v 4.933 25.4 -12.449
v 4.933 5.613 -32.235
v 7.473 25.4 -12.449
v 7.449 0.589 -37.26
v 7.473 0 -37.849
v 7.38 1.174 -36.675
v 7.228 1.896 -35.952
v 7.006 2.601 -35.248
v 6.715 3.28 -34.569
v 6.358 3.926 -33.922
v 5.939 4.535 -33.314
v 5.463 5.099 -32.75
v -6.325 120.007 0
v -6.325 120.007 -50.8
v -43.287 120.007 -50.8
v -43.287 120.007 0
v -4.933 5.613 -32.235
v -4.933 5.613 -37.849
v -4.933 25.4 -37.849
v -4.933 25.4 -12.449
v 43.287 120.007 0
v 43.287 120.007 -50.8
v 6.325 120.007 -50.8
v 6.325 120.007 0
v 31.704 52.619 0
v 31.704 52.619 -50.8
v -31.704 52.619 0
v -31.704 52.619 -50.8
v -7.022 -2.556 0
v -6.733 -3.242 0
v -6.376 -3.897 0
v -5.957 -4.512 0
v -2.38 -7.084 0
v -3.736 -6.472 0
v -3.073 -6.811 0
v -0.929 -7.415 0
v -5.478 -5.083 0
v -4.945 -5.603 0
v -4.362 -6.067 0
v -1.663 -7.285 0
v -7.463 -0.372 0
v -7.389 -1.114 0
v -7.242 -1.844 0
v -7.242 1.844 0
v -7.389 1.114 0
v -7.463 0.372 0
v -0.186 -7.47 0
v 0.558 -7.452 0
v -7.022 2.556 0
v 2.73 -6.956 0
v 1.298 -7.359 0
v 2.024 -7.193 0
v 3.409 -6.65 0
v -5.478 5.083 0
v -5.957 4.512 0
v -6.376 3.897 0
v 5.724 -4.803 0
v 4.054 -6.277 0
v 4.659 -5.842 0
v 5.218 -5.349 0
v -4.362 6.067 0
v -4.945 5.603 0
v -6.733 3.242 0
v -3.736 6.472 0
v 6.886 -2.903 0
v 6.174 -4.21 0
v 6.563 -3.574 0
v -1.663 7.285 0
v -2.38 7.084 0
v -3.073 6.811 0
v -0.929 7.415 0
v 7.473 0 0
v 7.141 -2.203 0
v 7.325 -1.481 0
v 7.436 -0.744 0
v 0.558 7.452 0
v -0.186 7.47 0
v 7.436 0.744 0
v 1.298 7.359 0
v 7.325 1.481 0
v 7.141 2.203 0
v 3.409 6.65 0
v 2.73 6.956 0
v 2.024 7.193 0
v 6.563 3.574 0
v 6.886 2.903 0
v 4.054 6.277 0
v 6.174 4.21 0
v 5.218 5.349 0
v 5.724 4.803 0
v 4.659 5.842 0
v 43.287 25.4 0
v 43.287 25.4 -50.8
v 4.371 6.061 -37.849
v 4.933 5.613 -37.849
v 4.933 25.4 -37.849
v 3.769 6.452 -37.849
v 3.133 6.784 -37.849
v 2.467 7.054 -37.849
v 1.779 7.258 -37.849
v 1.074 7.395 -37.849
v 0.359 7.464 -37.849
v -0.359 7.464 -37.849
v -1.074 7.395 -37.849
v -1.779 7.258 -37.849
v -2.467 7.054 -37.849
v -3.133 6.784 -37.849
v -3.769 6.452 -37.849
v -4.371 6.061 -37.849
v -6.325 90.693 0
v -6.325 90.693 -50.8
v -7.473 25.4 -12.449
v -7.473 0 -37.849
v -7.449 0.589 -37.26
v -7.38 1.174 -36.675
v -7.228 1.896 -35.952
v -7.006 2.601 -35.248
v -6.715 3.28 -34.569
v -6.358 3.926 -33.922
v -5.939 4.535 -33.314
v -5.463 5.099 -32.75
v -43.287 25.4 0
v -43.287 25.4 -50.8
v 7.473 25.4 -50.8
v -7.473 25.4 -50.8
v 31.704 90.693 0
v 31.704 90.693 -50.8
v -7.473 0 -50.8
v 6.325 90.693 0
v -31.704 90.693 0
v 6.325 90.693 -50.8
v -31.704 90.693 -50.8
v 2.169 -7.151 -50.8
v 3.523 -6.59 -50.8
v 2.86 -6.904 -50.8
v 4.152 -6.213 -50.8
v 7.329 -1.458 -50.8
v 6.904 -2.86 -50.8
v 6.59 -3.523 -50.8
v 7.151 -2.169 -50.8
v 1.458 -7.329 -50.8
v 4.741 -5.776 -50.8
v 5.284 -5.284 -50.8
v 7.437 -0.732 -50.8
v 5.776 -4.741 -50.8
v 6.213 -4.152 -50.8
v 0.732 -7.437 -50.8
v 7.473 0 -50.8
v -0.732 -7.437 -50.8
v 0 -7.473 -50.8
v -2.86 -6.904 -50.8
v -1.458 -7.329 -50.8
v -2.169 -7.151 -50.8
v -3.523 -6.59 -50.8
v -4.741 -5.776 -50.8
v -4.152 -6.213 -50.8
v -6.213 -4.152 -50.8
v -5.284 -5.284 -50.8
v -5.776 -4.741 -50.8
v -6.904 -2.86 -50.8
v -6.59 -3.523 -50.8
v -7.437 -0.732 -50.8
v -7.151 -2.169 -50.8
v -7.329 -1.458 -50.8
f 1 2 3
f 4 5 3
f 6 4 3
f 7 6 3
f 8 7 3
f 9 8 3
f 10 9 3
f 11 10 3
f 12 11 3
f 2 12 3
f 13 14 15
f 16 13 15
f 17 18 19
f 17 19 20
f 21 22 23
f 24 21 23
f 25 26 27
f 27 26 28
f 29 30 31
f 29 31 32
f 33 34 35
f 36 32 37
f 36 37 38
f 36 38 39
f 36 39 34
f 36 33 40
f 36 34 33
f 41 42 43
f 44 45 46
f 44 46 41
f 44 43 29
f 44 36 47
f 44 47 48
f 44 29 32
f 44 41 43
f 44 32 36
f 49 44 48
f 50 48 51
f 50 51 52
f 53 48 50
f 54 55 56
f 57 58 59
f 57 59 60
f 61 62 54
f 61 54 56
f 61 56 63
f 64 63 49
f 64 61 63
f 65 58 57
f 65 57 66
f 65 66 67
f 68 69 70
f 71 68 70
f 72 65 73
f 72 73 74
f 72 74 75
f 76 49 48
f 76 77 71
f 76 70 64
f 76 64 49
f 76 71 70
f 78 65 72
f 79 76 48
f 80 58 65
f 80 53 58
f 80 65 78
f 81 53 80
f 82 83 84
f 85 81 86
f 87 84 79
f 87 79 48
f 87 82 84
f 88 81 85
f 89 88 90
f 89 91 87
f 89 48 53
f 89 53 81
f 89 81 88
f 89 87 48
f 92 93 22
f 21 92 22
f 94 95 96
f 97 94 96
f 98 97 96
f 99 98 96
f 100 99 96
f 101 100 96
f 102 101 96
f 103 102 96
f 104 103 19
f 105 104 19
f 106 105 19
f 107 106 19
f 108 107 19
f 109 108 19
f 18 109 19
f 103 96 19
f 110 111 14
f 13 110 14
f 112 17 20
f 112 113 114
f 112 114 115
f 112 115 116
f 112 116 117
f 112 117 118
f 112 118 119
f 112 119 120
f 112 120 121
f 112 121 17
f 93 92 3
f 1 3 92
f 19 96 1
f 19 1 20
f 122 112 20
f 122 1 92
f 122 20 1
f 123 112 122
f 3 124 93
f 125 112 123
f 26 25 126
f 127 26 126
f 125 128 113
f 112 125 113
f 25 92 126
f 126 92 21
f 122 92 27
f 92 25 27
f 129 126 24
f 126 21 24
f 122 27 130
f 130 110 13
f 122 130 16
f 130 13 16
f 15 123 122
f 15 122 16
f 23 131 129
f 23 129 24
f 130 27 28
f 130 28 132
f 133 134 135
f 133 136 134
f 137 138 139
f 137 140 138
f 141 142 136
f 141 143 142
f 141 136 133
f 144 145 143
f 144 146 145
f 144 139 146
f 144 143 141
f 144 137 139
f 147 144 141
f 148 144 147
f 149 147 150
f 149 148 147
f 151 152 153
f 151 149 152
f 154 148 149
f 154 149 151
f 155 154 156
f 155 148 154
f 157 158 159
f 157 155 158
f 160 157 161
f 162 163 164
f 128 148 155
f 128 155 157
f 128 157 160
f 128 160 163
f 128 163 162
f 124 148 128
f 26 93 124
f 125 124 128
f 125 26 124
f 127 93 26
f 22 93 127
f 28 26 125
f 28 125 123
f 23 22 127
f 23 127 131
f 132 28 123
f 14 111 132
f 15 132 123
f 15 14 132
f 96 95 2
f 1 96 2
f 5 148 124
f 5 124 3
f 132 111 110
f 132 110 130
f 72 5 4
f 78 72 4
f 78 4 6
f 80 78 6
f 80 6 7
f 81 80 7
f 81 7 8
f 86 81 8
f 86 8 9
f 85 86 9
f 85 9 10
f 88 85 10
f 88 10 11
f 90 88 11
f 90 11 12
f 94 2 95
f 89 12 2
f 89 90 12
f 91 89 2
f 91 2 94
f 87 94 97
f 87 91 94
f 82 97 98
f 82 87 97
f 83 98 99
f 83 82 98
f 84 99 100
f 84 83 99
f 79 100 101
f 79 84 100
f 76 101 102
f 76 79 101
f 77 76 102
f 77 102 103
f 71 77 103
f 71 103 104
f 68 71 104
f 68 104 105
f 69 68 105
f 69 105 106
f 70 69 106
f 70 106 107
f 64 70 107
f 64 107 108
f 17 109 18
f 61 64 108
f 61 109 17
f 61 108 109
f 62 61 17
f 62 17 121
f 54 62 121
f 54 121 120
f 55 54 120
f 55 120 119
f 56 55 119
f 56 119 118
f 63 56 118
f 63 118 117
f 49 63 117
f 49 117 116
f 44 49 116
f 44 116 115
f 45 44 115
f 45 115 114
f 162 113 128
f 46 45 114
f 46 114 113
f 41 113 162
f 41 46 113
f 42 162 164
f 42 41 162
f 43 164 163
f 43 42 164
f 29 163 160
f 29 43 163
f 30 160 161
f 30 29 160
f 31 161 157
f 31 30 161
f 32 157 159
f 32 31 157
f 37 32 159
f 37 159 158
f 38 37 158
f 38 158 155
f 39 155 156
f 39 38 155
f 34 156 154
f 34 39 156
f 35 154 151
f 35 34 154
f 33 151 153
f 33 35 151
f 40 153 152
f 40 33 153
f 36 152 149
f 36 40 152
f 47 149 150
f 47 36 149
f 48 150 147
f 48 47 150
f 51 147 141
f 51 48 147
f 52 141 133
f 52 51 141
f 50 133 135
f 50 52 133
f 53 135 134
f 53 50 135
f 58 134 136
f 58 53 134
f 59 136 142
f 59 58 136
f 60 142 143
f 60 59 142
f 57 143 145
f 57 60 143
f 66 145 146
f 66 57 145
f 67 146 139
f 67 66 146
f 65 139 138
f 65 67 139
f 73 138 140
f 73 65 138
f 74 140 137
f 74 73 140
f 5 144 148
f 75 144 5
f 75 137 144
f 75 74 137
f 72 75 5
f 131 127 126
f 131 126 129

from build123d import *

# Parameters (mm, degrees)
SKETCH1_R             = 7.47268
BOSS_EXTRUDE1_DEPTH   = 50.8
SKETCH2_W             = 14.94536
SKETCH2_H             = 25.4
BOSS_EXTRUDE2_DEPTH   = 12.95146
SKETCH3_W             = 63.40856
SKETCH3_H             = 27.21864
BOSS_EXTRUDE3_DEPTH   = 50.8
SKETCH5_W             = 11.5824
SKETCH5_H             = 38.0746
BOSS_EXTRUDE4_DEPTH   = 50.8
BOSS_EXTRUDE4_2_DEPTH = 50.8
SKETCH7_W             = 11.5824
SKETCH7_H             = 27.21864
BOSS_EXTRUDE5_DEPTH   = 50.8
SKETCH8_W             = 25.37968
SKETCH8_H             = 29.31414
BOSS_EXTRUDE6_DEPTH   = 50.8
BOSS_EXTRUDE6_2_DEPTH = 50.8
SKETCH9_W             = 11.5824
SKETCH9_H             = 29.31414
BOSS_EXTRUDE7_DEPTH   = 50.8
BOSS_EXTRUDE8_DEPTH   = 2.54
BOSS_EXTRUDE9_DEPTH   = 2.54


with BuildPart() as part:
    # Sketch1 → Boss-Extrude1 (new body)
    with BuildSketch(Plane.XY):
        Circle(SKETCH1_R)
    extrude(amount=-BOSS_EXTRUDE1_DEPTH)

    # Sketch2 → Boss-Extrude2 (add)
    with BuildSketch(Plane(origin=(0, 0, -50.8), x_dir=(-1, 0, 0), z_dir=(0, 0, -1))):
        with Locations((0, 12.7)):
            Rectangle(SKETCH2_W, SKETCH2_H)
    extrude(amount=-BOSS_EXTRUDE2_DEPTH)

    # Sketch3 → Boss-Extrude3 (add)
    with BuildSketch(Plane(origin=(0, 0, -50.8), x_dir=(-1, 0, 0), z_dir=(0, 0, -1))):
        with Locations((0, 39.00932)):
            Rectangle(SKETCH3_W, SKETCH3_H)
    extrude(amount=-BOSS_EXTRUDE3_DEPTH)



with BuildPart() as body_2:
    # Sketch5 → Boss-Extrude4 (new body)
    with BuildSketch(Plane(origin=(0, 0, -50.8), x_dir=(-1, 0, 0), z_dir=(0, 0, -1))):
        with Locations((-37.49548, 71.65594)):
            Rectangle(SKETCH5_W, SKETCH5_H)
    extrude(amount=-BOSS_EXTRUDE4_DEPTH)


with BuildPart() as body_3:
    # Sketch5 → Boss-Extrude4 2 (new body)
    with BuildSketch(Plane(origin=(0, 0, -50.8), x_dir=(-1, 0, 0), z_dir=(0, 0, -1))):
        with Locations((37.49548, 71.65594)):
            Rectangle(SKETCH5_W, SKETCH5_H)
    extrude(amount=-BOSS_EXTRUDE4_2_DEPTH)


with BuildPart() as part_1:
    add(part.part)

    add(body_2.part)  # Boss-Extrude5 merges body 2

    add(body_3.part)  # Boss-Extrude5 merges body 3
    # Sketch7 → Boss-Extrude5 (add)
    with BuildSketch(Plane(origin=(0, 0, -50.8), x_dir=(-1, 0, 0), z_dir=(0, 0, -1))):
        with Locations((-37.49548, 39.00932)):
            Rectangle(SKETCH7_W, SKETCH7_H)
        with Locations((37.49548, 39.00932)):
            Rectangle(SKETCH7_W, SKETCH7_H)
    extrude(amount=-BOSS_EXTRUDE5_DEPTH)



with BuildPart() as body_2_2:
    # Sketch8 → Boss-Extrude6 (new body)
    with BuildSketch(Plane(origin=(0, 0, -50.8), x_dir=(-1, 0, 0), z_dir=(0, 0, -1))):
        with Locations((-19.01444, 105.35031)):
            Rectangle(SKETCH8_W, SKETCH8_H)
    extrude(amount=-BOSS_EXTRUDE6_DEPTH)


with BuildPart() as body_3_2:
    # Sketch8 → Boss-Extrude6 2 (new body)
    with BuildSketch(Plane(origin=(0, 0, -50.8), x_dir=(-1, 0, 0), z_dir=(0, 0, -1))):
        with Locations((19.01444, 105.35031)):
            Rectangle(SKETCH8_W, SKETCH8_H)
    extrude(amount=-BOSS_EXTRUDE6_2_DEPTH)


with BuildPart() as part_2:
    add(part_1.part)

    add(body_2_2.part)  # Boss-Extrude7 merges body 2 2

    add(body_3_2.part)  # Boss-Extrude7 merges body 3 2
    # Sketch9 → Boss-Extrude7 (add)
    with BuildSketch(Plane(origin=(0, 0, -50.8), x_dir=(-1, 0, 0), z_dir=(0, 0, -1))):
        with Locations((-37.49548, 105.35031)):
            Rectangle(SKETCH9_W, SKETCH9_H)
        with Locations((37.49548, 105.35031)):
            Rectangle(SKETCH9_W, SKETCH9_H)
    extrude(amount=-BOSS_EXTRUDE7_DEPTH)

    # Sketch10 → Boss-Extrude8 (add)
    with BuildSketch(Plane.ZY.offset(7.47268)):
        Polygon((-37.84854, 0), (-12.44854, 25.4), (-37.84854, 25.4), align=None)
    extrude(amount=-BOSS_EXTRUDE8_DEPTH)

    # Sketch11 → Boss-Extrude9 (add)
    with BuildSketch(Plane(origin=(7.47268, 0, 0), x_dir=(0, 0, -1), z_dir=(1, 0, 0))):
        Polygon((37.84854, 0), (12.44854, 25.4), (37.84854, 25.4), align=None)
    extrude(amount=-BOSS_EXTRUDE9_DEPTH)


solid = part_2.part
